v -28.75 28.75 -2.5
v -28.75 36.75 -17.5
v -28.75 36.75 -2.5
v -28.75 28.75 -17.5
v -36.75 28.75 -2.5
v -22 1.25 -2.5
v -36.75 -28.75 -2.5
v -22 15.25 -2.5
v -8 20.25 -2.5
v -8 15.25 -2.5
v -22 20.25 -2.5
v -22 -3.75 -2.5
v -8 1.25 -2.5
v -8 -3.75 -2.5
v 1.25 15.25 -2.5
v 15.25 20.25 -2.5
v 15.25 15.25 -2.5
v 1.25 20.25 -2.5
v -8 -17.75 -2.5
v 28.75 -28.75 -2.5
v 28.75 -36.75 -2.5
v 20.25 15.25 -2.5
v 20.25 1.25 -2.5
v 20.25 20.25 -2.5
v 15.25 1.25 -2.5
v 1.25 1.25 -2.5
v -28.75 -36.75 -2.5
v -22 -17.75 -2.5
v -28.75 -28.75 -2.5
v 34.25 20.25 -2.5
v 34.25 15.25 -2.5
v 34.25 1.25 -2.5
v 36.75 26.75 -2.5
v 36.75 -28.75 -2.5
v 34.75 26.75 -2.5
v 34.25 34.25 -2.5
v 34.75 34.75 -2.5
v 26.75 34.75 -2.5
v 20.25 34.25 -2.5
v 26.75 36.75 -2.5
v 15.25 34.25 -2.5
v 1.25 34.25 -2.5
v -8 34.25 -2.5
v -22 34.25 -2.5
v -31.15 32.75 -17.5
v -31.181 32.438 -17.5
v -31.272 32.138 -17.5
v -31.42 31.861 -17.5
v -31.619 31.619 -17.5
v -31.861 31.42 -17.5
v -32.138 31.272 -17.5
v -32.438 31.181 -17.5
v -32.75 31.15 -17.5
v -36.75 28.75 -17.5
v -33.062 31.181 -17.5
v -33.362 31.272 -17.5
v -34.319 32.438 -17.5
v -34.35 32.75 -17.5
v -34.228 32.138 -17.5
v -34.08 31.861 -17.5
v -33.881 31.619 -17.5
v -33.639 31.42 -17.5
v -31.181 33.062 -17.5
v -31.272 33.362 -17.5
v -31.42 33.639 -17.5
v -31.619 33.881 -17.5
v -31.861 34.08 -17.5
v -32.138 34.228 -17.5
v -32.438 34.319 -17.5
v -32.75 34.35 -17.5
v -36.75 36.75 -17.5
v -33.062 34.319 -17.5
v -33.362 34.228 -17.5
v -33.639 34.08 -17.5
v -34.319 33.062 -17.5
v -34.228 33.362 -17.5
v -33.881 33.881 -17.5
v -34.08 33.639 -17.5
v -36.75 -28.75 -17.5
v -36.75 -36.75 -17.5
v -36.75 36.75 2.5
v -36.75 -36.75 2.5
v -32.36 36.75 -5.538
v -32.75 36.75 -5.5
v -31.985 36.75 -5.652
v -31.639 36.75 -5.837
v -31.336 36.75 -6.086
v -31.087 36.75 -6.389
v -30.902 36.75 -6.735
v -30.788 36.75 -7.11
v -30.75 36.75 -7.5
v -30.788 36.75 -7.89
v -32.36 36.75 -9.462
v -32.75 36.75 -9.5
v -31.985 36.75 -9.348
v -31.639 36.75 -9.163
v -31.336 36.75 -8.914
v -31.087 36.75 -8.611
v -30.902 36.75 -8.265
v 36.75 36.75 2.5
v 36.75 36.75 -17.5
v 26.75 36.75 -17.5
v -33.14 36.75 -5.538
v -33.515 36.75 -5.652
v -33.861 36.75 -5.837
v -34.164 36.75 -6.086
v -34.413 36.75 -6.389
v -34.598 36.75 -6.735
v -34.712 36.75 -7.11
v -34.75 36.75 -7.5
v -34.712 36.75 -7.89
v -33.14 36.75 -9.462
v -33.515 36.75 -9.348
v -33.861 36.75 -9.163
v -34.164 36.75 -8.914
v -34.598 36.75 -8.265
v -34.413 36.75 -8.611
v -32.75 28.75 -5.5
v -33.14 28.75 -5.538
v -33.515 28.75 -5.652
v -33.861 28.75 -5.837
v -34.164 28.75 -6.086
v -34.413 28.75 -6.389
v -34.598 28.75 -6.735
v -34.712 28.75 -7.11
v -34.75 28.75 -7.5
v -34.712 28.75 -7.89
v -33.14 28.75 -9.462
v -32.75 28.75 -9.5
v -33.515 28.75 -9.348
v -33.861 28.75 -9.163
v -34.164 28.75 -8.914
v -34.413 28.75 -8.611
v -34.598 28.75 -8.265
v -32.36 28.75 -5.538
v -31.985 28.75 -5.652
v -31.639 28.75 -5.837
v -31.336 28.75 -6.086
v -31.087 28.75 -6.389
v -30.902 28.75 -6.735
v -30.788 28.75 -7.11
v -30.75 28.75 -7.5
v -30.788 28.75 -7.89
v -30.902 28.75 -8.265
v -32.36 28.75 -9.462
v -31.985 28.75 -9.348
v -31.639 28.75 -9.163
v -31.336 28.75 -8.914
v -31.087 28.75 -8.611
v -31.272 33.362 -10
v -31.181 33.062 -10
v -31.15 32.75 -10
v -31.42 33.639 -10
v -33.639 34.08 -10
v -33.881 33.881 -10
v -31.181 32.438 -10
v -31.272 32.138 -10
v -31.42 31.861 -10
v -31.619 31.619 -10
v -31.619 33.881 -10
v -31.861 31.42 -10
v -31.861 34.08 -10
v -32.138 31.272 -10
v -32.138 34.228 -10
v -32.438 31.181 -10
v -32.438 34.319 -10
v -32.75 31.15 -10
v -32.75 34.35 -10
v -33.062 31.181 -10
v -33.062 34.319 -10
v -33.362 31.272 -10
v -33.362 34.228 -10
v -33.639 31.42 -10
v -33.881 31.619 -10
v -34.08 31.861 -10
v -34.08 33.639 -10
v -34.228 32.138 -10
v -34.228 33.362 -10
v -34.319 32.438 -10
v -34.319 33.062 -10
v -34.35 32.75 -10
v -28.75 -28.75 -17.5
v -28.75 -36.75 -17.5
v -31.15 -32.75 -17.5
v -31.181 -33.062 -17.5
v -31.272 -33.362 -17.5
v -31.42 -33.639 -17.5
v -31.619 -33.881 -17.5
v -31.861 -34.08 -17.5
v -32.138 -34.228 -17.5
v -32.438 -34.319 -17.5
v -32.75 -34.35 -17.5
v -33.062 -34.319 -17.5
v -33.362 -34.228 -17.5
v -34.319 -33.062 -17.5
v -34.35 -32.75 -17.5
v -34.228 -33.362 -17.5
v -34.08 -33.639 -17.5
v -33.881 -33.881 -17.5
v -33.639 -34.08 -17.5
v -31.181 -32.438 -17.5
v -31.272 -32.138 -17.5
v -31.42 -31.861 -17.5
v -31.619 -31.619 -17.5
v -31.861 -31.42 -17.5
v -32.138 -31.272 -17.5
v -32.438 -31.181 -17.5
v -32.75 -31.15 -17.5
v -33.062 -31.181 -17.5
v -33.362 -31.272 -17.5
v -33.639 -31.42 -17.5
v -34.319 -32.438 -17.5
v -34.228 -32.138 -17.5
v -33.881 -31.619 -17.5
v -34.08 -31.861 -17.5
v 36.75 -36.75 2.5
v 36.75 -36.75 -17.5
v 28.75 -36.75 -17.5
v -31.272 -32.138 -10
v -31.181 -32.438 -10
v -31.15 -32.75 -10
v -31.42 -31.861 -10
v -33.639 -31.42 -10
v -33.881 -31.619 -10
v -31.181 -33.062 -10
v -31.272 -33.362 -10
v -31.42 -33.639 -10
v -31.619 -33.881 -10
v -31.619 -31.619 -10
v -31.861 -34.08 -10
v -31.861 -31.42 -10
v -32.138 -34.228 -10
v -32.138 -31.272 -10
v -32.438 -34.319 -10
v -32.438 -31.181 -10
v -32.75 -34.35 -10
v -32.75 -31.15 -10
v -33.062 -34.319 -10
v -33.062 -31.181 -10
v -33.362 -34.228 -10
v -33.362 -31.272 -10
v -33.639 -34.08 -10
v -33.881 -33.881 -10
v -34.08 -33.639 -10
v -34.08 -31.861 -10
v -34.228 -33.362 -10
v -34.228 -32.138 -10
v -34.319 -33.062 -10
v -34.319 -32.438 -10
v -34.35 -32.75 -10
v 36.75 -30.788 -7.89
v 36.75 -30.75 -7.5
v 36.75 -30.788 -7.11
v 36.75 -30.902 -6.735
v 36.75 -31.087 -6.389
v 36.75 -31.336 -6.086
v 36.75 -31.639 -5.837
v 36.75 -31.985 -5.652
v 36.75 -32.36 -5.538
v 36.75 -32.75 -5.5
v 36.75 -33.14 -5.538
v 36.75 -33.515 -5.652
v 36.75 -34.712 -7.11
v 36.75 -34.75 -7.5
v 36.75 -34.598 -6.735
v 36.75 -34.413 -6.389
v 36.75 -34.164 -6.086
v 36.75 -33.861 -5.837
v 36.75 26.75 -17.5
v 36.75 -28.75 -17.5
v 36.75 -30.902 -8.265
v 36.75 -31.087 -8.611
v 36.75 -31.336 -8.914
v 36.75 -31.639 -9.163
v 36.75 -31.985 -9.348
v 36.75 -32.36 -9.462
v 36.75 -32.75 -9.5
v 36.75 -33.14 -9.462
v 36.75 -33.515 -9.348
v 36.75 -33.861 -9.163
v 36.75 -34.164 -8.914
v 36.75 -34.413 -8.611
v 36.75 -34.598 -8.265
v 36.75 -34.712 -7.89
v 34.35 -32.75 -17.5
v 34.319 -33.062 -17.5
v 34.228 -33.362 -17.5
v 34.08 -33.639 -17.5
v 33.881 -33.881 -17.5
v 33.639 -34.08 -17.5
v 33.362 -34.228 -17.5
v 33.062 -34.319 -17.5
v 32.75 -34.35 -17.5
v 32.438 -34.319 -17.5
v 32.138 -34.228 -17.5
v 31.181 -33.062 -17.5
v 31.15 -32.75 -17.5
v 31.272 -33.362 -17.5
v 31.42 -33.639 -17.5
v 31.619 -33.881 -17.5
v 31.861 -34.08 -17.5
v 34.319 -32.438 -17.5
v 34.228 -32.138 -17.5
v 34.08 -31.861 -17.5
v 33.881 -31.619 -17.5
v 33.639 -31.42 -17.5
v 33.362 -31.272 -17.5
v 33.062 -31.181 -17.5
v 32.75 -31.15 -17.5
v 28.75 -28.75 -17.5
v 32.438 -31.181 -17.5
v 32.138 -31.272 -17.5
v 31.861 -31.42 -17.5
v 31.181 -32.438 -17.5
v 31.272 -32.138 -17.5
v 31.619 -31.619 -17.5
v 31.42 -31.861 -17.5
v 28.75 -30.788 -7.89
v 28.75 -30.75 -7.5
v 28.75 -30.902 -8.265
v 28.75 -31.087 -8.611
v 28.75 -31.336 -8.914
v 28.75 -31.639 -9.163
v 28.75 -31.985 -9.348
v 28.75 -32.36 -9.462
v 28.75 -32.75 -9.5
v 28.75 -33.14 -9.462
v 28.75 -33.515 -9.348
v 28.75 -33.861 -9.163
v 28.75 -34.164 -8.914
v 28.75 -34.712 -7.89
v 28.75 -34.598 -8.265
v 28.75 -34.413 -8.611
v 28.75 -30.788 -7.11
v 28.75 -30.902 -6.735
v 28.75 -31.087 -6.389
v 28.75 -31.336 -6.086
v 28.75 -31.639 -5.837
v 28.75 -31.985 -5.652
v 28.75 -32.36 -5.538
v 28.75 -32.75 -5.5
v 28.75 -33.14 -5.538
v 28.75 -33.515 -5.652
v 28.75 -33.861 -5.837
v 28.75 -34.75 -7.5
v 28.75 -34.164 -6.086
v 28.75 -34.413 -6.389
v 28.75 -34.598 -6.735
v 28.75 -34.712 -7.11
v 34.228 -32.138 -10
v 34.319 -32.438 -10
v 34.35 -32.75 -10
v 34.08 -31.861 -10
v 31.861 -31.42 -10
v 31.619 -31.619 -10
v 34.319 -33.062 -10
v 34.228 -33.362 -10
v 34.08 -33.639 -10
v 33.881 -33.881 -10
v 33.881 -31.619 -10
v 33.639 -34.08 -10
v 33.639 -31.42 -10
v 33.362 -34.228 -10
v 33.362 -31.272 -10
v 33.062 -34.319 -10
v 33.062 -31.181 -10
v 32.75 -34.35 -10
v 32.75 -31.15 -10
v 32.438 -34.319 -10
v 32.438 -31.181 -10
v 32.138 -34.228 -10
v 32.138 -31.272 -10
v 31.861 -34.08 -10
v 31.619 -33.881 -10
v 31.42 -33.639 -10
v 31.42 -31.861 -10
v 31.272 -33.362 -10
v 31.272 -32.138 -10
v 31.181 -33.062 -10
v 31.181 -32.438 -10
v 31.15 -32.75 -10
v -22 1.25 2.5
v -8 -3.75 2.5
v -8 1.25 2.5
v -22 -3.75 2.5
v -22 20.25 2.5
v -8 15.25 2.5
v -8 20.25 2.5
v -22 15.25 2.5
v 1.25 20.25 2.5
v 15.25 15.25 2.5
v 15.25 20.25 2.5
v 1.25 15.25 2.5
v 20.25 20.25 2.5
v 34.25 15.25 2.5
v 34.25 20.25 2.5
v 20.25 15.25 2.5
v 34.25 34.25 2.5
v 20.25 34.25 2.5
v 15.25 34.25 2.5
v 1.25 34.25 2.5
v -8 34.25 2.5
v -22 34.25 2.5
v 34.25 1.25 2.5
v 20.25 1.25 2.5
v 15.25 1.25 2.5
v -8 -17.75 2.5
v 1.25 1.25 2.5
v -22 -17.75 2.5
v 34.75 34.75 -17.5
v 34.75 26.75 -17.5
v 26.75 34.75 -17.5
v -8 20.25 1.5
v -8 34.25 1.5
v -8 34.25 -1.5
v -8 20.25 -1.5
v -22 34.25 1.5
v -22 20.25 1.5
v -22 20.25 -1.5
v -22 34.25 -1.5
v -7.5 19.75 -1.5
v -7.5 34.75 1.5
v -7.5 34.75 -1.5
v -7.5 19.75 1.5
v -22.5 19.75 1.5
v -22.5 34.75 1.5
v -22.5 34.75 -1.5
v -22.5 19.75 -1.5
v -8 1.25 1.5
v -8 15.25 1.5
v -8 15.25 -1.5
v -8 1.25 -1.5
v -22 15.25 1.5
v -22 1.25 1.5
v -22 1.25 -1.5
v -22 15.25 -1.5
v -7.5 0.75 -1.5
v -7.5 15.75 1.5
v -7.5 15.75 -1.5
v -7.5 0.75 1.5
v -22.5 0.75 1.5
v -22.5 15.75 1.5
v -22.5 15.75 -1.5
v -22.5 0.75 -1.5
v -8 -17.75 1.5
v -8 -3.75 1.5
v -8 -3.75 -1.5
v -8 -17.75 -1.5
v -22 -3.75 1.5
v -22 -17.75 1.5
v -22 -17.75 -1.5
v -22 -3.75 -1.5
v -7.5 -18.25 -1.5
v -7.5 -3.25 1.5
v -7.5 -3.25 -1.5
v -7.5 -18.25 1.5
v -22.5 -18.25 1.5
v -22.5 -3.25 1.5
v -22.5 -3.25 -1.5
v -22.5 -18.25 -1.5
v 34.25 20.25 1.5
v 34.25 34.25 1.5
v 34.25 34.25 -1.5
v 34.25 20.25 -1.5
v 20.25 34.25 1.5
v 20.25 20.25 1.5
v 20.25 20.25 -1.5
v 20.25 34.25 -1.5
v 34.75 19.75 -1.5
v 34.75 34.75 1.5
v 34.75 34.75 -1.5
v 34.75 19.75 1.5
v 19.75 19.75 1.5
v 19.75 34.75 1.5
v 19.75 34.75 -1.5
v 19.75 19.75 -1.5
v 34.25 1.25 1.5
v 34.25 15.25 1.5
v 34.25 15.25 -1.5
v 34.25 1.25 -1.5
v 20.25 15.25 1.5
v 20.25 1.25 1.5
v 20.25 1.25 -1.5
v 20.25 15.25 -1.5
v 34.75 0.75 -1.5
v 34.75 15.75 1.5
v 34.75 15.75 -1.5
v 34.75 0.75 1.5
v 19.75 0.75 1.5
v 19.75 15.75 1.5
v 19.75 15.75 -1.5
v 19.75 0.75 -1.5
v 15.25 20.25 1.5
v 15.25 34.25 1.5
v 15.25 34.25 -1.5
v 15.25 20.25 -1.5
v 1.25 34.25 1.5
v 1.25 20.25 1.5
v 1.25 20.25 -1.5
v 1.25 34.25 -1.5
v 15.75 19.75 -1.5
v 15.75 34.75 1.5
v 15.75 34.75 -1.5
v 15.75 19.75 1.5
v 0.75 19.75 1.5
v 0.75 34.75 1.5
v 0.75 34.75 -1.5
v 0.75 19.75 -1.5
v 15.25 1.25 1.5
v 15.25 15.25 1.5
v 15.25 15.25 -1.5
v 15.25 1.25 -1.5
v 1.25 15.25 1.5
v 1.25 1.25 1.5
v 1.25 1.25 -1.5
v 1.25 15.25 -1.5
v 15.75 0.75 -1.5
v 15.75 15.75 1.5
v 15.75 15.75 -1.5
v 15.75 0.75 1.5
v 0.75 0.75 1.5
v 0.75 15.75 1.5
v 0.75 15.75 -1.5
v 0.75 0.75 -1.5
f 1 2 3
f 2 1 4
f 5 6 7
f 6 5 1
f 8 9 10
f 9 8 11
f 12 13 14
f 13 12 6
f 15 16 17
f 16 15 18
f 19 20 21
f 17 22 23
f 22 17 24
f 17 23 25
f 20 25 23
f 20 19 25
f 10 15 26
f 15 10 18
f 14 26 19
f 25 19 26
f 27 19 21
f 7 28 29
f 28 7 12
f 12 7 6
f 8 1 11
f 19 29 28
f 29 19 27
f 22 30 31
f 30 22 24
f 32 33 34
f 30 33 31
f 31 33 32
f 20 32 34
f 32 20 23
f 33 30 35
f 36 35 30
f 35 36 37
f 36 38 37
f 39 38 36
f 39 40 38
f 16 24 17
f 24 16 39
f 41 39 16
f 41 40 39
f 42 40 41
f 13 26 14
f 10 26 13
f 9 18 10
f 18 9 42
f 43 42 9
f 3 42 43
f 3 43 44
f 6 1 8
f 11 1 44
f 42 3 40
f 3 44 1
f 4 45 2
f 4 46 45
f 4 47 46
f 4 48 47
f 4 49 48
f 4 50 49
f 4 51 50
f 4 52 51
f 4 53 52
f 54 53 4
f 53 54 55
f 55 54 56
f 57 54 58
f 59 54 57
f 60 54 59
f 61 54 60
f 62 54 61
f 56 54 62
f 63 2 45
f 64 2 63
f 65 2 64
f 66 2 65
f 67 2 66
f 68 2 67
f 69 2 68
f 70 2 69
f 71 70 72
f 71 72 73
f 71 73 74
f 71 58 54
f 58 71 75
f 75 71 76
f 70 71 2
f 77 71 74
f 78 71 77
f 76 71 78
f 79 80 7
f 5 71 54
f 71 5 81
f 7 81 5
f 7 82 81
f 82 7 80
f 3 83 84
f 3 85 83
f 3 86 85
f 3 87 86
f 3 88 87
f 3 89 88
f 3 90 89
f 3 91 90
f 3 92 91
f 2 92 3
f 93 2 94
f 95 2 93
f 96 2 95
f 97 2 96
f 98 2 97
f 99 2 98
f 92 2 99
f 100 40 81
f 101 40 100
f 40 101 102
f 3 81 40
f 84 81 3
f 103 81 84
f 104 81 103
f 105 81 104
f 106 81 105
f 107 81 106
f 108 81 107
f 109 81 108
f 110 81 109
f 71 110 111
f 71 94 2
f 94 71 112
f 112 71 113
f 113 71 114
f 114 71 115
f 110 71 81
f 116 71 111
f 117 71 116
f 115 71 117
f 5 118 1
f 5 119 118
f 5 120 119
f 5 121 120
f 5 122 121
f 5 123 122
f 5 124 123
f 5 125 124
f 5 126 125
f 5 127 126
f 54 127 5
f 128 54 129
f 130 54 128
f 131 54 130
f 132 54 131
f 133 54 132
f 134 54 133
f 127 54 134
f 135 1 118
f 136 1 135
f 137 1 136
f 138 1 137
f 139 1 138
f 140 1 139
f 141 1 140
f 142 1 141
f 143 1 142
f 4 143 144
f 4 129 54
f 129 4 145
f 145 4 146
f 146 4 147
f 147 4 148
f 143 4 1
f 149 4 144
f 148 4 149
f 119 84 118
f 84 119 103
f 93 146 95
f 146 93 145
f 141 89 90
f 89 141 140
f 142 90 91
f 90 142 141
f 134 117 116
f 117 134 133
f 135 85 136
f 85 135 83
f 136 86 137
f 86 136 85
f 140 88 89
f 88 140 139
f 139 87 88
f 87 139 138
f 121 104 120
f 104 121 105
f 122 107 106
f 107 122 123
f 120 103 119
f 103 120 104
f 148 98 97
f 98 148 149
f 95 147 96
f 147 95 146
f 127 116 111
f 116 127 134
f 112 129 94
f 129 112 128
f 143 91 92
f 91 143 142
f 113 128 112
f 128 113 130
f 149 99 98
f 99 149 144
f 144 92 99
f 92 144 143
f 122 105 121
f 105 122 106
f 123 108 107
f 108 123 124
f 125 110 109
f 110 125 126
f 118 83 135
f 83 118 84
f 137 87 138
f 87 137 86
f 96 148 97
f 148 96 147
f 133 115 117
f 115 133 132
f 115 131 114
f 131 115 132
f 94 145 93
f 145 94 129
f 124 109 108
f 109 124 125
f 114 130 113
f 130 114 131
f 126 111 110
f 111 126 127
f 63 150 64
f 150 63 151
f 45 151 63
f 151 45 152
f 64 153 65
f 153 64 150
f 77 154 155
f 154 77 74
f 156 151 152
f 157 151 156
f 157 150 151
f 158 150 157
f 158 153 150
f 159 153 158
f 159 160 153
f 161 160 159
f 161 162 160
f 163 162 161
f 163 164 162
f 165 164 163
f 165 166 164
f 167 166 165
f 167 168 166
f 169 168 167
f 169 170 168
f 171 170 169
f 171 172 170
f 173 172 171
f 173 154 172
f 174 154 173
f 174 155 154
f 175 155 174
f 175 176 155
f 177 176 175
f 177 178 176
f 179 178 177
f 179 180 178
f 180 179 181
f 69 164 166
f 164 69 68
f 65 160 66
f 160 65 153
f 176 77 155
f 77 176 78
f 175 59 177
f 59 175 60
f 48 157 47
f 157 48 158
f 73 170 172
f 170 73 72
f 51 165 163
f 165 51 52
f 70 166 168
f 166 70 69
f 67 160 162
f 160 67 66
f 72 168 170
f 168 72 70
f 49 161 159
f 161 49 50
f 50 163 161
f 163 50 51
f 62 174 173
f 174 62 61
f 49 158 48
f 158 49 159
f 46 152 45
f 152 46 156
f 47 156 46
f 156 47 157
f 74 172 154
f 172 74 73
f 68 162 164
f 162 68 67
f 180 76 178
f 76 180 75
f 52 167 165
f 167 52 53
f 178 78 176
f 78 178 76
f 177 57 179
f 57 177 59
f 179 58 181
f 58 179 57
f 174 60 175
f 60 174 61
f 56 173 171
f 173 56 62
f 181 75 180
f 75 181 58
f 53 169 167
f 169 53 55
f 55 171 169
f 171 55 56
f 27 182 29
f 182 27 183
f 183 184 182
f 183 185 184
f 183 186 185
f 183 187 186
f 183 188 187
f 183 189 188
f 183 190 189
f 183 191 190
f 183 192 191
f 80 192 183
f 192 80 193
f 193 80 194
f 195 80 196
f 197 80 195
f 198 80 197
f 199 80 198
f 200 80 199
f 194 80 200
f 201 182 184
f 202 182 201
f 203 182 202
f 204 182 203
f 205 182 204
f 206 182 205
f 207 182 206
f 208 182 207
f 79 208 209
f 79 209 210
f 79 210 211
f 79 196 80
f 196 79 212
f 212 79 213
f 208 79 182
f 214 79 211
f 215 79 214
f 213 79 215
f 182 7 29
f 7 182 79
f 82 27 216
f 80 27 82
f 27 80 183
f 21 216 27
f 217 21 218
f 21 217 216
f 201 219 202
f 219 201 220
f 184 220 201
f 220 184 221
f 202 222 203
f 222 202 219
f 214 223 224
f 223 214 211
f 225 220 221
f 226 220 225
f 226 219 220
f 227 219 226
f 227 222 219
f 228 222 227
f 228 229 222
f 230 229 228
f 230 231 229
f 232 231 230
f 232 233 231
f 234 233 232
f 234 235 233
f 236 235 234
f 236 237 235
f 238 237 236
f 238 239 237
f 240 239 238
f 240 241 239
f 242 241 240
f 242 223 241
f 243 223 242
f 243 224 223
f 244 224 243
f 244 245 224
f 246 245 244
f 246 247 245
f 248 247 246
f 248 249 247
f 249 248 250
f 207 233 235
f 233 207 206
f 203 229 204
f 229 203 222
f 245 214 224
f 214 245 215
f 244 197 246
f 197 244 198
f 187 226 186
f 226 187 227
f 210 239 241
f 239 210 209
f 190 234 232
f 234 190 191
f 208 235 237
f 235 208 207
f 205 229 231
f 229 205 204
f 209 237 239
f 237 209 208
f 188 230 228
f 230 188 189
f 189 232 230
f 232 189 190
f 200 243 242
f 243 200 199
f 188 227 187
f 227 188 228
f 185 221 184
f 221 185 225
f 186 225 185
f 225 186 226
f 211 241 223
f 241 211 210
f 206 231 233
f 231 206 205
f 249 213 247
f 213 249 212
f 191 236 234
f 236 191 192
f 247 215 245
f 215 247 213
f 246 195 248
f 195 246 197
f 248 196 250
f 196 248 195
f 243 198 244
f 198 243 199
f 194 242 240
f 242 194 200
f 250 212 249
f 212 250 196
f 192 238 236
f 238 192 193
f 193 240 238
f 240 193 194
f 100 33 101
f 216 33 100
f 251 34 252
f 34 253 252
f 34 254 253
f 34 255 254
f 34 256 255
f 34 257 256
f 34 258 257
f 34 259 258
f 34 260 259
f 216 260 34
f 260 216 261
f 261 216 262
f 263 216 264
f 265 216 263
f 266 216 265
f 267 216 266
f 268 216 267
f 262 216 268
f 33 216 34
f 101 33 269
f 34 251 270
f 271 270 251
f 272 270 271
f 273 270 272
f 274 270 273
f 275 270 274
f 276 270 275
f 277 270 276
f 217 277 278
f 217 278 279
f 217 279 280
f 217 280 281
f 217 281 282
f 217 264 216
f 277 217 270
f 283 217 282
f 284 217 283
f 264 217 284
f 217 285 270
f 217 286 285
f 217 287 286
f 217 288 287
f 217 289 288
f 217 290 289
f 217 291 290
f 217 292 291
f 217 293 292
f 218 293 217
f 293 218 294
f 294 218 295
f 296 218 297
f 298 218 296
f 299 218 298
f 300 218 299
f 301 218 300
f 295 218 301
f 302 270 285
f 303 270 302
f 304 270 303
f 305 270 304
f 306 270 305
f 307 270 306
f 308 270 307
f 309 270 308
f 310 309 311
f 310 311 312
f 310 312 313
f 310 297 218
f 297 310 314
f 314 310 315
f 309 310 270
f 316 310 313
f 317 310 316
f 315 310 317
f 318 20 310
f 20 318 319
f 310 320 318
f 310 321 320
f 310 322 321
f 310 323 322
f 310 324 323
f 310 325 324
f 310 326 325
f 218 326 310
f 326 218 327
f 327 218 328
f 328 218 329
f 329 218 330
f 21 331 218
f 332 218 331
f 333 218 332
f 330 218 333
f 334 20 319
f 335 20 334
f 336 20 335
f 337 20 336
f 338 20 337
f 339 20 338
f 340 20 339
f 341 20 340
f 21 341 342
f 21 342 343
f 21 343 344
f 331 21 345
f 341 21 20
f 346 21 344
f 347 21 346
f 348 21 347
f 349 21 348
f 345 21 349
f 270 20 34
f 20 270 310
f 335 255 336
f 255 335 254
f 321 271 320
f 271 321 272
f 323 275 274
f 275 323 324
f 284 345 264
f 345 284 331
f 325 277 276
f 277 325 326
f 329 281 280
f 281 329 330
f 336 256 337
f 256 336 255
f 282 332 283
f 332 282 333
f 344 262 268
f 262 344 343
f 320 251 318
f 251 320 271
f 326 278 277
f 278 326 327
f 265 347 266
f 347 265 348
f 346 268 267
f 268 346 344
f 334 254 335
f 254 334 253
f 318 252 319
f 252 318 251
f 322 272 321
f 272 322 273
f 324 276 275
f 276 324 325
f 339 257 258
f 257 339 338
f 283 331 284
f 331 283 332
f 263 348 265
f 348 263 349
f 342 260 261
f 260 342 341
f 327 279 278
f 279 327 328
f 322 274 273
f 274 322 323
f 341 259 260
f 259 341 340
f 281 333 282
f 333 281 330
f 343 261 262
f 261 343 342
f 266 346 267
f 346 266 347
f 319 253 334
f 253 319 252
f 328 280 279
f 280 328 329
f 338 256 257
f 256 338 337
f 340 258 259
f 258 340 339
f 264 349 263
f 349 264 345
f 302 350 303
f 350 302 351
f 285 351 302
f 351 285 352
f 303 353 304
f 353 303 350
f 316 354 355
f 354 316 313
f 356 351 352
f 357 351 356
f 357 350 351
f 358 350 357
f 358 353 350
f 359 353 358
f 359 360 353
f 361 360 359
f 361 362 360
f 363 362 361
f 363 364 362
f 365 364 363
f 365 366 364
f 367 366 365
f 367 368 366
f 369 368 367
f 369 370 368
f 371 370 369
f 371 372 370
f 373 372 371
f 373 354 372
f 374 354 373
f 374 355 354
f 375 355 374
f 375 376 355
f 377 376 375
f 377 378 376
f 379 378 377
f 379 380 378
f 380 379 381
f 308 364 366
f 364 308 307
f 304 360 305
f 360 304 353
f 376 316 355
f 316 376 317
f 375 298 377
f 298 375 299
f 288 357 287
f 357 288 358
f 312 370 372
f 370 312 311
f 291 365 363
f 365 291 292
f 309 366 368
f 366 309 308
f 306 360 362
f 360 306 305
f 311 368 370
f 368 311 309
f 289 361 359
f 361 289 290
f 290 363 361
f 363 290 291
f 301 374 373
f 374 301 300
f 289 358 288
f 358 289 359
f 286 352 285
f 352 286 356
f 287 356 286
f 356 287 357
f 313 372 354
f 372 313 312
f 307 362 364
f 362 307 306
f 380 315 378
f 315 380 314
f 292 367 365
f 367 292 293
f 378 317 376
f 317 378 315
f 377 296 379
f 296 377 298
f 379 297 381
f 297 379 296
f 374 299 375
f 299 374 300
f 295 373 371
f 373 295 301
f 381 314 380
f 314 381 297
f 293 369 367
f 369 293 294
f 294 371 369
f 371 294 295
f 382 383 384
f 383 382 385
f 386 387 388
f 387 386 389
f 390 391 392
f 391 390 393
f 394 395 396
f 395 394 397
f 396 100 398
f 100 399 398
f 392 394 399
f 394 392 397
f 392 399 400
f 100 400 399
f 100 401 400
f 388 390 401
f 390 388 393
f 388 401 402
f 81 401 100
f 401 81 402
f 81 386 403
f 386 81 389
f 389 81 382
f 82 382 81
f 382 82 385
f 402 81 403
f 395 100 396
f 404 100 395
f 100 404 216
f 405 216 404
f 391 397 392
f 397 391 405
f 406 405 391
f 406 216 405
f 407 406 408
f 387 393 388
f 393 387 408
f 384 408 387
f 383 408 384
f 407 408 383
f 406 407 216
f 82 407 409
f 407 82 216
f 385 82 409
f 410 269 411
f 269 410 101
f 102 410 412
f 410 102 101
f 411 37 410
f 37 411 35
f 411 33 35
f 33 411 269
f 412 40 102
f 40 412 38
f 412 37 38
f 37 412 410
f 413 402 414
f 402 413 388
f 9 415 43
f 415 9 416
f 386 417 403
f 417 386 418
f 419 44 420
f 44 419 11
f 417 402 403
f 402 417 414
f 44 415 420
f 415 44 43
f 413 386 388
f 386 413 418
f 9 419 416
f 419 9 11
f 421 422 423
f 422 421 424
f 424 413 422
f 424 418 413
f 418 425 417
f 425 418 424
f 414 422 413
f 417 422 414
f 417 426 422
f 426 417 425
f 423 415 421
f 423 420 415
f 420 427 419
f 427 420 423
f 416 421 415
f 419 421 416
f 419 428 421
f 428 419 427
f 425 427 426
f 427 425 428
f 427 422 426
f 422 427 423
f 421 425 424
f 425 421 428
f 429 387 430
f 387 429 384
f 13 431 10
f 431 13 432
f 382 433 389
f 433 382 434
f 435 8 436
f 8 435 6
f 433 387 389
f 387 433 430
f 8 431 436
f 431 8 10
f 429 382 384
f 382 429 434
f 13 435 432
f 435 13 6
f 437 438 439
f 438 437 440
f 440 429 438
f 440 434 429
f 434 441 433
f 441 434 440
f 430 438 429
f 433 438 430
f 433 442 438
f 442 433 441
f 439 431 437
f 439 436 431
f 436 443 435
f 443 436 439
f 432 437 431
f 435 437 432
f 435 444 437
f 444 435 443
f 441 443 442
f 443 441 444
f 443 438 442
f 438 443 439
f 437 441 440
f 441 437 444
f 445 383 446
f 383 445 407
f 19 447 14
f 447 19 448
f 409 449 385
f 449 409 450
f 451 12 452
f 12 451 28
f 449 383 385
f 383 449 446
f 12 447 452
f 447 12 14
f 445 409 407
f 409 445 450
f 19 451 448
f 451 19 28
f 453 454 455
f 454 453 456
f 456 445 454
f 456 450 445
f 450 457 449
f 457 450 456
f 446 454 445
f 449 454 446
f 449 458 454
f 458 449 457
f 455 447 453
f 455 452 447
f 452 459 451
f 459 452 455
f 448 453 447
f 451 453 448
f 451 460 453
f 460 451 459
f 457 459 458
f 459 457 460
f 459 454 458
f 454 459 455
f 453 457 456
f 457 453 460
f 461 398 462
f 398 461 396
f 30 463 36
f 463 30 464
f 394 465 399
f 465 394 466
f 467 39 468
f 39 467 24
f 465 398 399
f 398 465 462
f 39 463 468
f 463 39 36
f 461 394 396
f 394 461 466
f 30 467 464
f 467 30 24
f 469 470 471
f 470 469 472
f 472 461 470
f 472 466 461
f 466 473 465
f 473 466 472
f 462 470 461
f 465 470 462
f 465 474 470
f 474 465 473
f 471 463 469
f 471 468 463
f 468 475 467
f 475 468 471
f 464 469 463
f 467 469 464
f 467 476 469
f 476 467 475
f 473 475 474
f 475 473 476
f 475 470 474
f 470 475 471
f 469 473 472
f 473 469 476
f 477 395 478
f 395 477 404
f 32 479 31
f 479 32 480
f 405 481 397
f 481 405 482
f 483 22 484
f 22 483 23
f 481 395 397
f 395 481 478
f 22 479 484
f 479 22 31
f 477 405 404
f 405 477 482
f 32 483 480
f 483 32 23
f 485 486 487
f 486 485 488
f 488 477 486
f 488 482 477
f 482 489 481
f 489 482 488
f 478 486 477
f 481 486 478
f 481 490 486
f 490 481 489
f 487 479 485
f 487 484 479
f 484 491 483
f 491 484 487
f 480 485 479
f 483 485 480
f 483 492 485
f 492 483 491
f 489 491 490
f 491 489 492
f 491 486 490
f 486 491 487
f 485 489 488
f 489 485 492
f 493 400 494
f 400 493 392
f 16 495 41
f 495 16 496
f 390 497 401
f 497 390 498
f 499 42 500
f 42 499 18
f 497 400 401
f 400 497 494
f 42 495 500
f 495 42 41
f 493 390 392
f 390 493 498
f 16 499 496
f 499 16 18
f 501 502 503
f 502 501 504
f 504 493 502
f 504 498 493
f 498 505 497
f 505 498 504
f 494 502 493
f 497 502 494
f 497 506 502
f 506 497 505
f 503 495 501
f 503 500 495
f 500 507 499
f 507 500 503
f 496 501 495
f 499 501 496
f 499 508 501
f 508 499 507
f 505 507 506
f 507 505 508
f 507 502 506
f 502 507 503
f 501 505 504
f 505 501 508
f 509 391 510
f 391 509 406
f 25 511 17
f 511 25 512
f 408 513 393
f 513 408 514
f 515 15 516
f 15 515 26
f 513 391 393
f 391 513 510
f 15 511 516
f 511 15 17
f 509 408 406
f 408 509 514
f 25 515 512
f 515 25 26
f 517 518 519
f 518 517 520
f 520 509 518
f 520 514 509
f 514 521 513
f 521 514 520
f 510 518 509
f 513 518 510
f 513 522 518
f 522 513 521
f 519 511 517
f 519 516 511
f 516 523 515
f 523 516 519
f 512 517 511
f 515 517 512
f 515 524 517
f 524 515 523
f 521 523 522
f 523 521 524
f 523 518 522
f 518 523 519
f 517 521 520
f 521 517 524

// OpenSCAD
// file: common.scad
key_size = 14;
stabilizer_size = 3.5;

b_post = 8;
m_post_s = 2;
m_post_l = 10;
post_z = 15;

plat_z = 5;

module keyhole(x, y) {
  translate([x, y, 0]) {
    cube([key_size, key_size, plat_z + 1], center = true);
    cube([key_size + 1, key_size + 1, plat_z - 2], center = true);
  }
}

module double_wide(x, y) {
  keyhole(x, y);
  for (offset=[-12, 12]) {
     translate([x + offset, y - 1, 0]) {
       cube([stabilizer_size, key_size, plat_z + 1], center = true);
       translate([0, key_size/2, 0])
         cube([stabilizer_size, 1, plat_z - 2], center = true);
       translate([0, -key_size/2, 0])
         cube([stabilizer_size, 2, plat_z - 2], center = true);
     }
  }
}

module e_post(x, y, z) {
  translate([x, y, -(plat_z + post_z)/2]) {
    difference() {
      cube([b_post, b_post, post_z], center = true);
      translate([0, 0, -post_z/2]) cylinder(h=post_z, r=1.6, center=true, $fn=32);
    }
  }
}

module e_post_i(x, y, r) {
  translate([x, y, -(plat_z + post_z)/2]) {
    difference() {
      cube([b_post, b_post, post_z], center = true);
      translate([0, 0, post_z/6]) rotate(r) cylinder(h=b_post+1, r=2, center=true, $fn=32);
      translate([0, 0, -post_z/2]) cylinder(h=post_z, r=1.6, center=true, $fn=32);
    }
  }
}

module e_post_x(x, y) {
  e_post_i(x, y, [0, 90, 0]);
}


module e_post_y(x, y) {
  e_post_i(x, y, [90, 0, 0]);
}

module i_post_x(x, y) {
  translate([x, y, -(plat_z + post_z)/2]) cube([m_post_l, m_post_s, post_z], center = true);
}

module i_post_y(x, y) {
  translate([x, y, -(plat_z + post_z)/2]) cube([m_post_s, m_post_l, post_z], center = true);
}
// file: parameters.scad
key_size = 14;
key_sep = 5;
m_key_sep = 13.5;
l_key_sep = 33;

border = 8;
b_post = 8;
m_post_s = 2;
m_post_l = 10;
post_z = 15;

key_cell = key_size + key_sep;
m_key_cell_x = key_size + m_key_sep;
l_key_cell_x = 2*key_cell;

plat_z = 5;
// main file
// Alien bat section 5: bottom left section

include <parameters.scad>

plat_x = border + m_key_cell_x + 2 * key_cell;
plat_y = border + 2 * key_cell + m_key_cell_x;

use <common.scad>

difference() {
  union() {
    cube([plat_x, plat_y, 5], center = true);
    e_post_y(-(plat_x-b_post)/2, (plat_y-b_post)/2);
    e_post(-(plat_x-b_post)/2, -(plat_y-b_post)/2);
    e_post_x((plat_x-b_post)/2, -(plat_y-b_post)/2);

    i_post_y((plat_x-m_post_s)/2, (plat_y-m_post_l)/2);
    i_post_x((plat_x-m_post_l)/2, (plat_y-m_post_s)/2);
  }

  for (i = [0:2]) {
    keyhole(-plat_x/2 + border + m_key_cell_x/2, plat_y/2 - i*key_cell - key_cell/2);
  }
  for (i = [0:1]) {
    keyhole(plat_x/2 - key_cell/2, plat_y/2 - i*key_cell - key_cell/2);
  }
  for (i = [0:1]) {
    keyhole(plat_x/2 - key_cell - key_cell/2, plat_y/2 - i*key_cell - key_cell/2);
  }

}
